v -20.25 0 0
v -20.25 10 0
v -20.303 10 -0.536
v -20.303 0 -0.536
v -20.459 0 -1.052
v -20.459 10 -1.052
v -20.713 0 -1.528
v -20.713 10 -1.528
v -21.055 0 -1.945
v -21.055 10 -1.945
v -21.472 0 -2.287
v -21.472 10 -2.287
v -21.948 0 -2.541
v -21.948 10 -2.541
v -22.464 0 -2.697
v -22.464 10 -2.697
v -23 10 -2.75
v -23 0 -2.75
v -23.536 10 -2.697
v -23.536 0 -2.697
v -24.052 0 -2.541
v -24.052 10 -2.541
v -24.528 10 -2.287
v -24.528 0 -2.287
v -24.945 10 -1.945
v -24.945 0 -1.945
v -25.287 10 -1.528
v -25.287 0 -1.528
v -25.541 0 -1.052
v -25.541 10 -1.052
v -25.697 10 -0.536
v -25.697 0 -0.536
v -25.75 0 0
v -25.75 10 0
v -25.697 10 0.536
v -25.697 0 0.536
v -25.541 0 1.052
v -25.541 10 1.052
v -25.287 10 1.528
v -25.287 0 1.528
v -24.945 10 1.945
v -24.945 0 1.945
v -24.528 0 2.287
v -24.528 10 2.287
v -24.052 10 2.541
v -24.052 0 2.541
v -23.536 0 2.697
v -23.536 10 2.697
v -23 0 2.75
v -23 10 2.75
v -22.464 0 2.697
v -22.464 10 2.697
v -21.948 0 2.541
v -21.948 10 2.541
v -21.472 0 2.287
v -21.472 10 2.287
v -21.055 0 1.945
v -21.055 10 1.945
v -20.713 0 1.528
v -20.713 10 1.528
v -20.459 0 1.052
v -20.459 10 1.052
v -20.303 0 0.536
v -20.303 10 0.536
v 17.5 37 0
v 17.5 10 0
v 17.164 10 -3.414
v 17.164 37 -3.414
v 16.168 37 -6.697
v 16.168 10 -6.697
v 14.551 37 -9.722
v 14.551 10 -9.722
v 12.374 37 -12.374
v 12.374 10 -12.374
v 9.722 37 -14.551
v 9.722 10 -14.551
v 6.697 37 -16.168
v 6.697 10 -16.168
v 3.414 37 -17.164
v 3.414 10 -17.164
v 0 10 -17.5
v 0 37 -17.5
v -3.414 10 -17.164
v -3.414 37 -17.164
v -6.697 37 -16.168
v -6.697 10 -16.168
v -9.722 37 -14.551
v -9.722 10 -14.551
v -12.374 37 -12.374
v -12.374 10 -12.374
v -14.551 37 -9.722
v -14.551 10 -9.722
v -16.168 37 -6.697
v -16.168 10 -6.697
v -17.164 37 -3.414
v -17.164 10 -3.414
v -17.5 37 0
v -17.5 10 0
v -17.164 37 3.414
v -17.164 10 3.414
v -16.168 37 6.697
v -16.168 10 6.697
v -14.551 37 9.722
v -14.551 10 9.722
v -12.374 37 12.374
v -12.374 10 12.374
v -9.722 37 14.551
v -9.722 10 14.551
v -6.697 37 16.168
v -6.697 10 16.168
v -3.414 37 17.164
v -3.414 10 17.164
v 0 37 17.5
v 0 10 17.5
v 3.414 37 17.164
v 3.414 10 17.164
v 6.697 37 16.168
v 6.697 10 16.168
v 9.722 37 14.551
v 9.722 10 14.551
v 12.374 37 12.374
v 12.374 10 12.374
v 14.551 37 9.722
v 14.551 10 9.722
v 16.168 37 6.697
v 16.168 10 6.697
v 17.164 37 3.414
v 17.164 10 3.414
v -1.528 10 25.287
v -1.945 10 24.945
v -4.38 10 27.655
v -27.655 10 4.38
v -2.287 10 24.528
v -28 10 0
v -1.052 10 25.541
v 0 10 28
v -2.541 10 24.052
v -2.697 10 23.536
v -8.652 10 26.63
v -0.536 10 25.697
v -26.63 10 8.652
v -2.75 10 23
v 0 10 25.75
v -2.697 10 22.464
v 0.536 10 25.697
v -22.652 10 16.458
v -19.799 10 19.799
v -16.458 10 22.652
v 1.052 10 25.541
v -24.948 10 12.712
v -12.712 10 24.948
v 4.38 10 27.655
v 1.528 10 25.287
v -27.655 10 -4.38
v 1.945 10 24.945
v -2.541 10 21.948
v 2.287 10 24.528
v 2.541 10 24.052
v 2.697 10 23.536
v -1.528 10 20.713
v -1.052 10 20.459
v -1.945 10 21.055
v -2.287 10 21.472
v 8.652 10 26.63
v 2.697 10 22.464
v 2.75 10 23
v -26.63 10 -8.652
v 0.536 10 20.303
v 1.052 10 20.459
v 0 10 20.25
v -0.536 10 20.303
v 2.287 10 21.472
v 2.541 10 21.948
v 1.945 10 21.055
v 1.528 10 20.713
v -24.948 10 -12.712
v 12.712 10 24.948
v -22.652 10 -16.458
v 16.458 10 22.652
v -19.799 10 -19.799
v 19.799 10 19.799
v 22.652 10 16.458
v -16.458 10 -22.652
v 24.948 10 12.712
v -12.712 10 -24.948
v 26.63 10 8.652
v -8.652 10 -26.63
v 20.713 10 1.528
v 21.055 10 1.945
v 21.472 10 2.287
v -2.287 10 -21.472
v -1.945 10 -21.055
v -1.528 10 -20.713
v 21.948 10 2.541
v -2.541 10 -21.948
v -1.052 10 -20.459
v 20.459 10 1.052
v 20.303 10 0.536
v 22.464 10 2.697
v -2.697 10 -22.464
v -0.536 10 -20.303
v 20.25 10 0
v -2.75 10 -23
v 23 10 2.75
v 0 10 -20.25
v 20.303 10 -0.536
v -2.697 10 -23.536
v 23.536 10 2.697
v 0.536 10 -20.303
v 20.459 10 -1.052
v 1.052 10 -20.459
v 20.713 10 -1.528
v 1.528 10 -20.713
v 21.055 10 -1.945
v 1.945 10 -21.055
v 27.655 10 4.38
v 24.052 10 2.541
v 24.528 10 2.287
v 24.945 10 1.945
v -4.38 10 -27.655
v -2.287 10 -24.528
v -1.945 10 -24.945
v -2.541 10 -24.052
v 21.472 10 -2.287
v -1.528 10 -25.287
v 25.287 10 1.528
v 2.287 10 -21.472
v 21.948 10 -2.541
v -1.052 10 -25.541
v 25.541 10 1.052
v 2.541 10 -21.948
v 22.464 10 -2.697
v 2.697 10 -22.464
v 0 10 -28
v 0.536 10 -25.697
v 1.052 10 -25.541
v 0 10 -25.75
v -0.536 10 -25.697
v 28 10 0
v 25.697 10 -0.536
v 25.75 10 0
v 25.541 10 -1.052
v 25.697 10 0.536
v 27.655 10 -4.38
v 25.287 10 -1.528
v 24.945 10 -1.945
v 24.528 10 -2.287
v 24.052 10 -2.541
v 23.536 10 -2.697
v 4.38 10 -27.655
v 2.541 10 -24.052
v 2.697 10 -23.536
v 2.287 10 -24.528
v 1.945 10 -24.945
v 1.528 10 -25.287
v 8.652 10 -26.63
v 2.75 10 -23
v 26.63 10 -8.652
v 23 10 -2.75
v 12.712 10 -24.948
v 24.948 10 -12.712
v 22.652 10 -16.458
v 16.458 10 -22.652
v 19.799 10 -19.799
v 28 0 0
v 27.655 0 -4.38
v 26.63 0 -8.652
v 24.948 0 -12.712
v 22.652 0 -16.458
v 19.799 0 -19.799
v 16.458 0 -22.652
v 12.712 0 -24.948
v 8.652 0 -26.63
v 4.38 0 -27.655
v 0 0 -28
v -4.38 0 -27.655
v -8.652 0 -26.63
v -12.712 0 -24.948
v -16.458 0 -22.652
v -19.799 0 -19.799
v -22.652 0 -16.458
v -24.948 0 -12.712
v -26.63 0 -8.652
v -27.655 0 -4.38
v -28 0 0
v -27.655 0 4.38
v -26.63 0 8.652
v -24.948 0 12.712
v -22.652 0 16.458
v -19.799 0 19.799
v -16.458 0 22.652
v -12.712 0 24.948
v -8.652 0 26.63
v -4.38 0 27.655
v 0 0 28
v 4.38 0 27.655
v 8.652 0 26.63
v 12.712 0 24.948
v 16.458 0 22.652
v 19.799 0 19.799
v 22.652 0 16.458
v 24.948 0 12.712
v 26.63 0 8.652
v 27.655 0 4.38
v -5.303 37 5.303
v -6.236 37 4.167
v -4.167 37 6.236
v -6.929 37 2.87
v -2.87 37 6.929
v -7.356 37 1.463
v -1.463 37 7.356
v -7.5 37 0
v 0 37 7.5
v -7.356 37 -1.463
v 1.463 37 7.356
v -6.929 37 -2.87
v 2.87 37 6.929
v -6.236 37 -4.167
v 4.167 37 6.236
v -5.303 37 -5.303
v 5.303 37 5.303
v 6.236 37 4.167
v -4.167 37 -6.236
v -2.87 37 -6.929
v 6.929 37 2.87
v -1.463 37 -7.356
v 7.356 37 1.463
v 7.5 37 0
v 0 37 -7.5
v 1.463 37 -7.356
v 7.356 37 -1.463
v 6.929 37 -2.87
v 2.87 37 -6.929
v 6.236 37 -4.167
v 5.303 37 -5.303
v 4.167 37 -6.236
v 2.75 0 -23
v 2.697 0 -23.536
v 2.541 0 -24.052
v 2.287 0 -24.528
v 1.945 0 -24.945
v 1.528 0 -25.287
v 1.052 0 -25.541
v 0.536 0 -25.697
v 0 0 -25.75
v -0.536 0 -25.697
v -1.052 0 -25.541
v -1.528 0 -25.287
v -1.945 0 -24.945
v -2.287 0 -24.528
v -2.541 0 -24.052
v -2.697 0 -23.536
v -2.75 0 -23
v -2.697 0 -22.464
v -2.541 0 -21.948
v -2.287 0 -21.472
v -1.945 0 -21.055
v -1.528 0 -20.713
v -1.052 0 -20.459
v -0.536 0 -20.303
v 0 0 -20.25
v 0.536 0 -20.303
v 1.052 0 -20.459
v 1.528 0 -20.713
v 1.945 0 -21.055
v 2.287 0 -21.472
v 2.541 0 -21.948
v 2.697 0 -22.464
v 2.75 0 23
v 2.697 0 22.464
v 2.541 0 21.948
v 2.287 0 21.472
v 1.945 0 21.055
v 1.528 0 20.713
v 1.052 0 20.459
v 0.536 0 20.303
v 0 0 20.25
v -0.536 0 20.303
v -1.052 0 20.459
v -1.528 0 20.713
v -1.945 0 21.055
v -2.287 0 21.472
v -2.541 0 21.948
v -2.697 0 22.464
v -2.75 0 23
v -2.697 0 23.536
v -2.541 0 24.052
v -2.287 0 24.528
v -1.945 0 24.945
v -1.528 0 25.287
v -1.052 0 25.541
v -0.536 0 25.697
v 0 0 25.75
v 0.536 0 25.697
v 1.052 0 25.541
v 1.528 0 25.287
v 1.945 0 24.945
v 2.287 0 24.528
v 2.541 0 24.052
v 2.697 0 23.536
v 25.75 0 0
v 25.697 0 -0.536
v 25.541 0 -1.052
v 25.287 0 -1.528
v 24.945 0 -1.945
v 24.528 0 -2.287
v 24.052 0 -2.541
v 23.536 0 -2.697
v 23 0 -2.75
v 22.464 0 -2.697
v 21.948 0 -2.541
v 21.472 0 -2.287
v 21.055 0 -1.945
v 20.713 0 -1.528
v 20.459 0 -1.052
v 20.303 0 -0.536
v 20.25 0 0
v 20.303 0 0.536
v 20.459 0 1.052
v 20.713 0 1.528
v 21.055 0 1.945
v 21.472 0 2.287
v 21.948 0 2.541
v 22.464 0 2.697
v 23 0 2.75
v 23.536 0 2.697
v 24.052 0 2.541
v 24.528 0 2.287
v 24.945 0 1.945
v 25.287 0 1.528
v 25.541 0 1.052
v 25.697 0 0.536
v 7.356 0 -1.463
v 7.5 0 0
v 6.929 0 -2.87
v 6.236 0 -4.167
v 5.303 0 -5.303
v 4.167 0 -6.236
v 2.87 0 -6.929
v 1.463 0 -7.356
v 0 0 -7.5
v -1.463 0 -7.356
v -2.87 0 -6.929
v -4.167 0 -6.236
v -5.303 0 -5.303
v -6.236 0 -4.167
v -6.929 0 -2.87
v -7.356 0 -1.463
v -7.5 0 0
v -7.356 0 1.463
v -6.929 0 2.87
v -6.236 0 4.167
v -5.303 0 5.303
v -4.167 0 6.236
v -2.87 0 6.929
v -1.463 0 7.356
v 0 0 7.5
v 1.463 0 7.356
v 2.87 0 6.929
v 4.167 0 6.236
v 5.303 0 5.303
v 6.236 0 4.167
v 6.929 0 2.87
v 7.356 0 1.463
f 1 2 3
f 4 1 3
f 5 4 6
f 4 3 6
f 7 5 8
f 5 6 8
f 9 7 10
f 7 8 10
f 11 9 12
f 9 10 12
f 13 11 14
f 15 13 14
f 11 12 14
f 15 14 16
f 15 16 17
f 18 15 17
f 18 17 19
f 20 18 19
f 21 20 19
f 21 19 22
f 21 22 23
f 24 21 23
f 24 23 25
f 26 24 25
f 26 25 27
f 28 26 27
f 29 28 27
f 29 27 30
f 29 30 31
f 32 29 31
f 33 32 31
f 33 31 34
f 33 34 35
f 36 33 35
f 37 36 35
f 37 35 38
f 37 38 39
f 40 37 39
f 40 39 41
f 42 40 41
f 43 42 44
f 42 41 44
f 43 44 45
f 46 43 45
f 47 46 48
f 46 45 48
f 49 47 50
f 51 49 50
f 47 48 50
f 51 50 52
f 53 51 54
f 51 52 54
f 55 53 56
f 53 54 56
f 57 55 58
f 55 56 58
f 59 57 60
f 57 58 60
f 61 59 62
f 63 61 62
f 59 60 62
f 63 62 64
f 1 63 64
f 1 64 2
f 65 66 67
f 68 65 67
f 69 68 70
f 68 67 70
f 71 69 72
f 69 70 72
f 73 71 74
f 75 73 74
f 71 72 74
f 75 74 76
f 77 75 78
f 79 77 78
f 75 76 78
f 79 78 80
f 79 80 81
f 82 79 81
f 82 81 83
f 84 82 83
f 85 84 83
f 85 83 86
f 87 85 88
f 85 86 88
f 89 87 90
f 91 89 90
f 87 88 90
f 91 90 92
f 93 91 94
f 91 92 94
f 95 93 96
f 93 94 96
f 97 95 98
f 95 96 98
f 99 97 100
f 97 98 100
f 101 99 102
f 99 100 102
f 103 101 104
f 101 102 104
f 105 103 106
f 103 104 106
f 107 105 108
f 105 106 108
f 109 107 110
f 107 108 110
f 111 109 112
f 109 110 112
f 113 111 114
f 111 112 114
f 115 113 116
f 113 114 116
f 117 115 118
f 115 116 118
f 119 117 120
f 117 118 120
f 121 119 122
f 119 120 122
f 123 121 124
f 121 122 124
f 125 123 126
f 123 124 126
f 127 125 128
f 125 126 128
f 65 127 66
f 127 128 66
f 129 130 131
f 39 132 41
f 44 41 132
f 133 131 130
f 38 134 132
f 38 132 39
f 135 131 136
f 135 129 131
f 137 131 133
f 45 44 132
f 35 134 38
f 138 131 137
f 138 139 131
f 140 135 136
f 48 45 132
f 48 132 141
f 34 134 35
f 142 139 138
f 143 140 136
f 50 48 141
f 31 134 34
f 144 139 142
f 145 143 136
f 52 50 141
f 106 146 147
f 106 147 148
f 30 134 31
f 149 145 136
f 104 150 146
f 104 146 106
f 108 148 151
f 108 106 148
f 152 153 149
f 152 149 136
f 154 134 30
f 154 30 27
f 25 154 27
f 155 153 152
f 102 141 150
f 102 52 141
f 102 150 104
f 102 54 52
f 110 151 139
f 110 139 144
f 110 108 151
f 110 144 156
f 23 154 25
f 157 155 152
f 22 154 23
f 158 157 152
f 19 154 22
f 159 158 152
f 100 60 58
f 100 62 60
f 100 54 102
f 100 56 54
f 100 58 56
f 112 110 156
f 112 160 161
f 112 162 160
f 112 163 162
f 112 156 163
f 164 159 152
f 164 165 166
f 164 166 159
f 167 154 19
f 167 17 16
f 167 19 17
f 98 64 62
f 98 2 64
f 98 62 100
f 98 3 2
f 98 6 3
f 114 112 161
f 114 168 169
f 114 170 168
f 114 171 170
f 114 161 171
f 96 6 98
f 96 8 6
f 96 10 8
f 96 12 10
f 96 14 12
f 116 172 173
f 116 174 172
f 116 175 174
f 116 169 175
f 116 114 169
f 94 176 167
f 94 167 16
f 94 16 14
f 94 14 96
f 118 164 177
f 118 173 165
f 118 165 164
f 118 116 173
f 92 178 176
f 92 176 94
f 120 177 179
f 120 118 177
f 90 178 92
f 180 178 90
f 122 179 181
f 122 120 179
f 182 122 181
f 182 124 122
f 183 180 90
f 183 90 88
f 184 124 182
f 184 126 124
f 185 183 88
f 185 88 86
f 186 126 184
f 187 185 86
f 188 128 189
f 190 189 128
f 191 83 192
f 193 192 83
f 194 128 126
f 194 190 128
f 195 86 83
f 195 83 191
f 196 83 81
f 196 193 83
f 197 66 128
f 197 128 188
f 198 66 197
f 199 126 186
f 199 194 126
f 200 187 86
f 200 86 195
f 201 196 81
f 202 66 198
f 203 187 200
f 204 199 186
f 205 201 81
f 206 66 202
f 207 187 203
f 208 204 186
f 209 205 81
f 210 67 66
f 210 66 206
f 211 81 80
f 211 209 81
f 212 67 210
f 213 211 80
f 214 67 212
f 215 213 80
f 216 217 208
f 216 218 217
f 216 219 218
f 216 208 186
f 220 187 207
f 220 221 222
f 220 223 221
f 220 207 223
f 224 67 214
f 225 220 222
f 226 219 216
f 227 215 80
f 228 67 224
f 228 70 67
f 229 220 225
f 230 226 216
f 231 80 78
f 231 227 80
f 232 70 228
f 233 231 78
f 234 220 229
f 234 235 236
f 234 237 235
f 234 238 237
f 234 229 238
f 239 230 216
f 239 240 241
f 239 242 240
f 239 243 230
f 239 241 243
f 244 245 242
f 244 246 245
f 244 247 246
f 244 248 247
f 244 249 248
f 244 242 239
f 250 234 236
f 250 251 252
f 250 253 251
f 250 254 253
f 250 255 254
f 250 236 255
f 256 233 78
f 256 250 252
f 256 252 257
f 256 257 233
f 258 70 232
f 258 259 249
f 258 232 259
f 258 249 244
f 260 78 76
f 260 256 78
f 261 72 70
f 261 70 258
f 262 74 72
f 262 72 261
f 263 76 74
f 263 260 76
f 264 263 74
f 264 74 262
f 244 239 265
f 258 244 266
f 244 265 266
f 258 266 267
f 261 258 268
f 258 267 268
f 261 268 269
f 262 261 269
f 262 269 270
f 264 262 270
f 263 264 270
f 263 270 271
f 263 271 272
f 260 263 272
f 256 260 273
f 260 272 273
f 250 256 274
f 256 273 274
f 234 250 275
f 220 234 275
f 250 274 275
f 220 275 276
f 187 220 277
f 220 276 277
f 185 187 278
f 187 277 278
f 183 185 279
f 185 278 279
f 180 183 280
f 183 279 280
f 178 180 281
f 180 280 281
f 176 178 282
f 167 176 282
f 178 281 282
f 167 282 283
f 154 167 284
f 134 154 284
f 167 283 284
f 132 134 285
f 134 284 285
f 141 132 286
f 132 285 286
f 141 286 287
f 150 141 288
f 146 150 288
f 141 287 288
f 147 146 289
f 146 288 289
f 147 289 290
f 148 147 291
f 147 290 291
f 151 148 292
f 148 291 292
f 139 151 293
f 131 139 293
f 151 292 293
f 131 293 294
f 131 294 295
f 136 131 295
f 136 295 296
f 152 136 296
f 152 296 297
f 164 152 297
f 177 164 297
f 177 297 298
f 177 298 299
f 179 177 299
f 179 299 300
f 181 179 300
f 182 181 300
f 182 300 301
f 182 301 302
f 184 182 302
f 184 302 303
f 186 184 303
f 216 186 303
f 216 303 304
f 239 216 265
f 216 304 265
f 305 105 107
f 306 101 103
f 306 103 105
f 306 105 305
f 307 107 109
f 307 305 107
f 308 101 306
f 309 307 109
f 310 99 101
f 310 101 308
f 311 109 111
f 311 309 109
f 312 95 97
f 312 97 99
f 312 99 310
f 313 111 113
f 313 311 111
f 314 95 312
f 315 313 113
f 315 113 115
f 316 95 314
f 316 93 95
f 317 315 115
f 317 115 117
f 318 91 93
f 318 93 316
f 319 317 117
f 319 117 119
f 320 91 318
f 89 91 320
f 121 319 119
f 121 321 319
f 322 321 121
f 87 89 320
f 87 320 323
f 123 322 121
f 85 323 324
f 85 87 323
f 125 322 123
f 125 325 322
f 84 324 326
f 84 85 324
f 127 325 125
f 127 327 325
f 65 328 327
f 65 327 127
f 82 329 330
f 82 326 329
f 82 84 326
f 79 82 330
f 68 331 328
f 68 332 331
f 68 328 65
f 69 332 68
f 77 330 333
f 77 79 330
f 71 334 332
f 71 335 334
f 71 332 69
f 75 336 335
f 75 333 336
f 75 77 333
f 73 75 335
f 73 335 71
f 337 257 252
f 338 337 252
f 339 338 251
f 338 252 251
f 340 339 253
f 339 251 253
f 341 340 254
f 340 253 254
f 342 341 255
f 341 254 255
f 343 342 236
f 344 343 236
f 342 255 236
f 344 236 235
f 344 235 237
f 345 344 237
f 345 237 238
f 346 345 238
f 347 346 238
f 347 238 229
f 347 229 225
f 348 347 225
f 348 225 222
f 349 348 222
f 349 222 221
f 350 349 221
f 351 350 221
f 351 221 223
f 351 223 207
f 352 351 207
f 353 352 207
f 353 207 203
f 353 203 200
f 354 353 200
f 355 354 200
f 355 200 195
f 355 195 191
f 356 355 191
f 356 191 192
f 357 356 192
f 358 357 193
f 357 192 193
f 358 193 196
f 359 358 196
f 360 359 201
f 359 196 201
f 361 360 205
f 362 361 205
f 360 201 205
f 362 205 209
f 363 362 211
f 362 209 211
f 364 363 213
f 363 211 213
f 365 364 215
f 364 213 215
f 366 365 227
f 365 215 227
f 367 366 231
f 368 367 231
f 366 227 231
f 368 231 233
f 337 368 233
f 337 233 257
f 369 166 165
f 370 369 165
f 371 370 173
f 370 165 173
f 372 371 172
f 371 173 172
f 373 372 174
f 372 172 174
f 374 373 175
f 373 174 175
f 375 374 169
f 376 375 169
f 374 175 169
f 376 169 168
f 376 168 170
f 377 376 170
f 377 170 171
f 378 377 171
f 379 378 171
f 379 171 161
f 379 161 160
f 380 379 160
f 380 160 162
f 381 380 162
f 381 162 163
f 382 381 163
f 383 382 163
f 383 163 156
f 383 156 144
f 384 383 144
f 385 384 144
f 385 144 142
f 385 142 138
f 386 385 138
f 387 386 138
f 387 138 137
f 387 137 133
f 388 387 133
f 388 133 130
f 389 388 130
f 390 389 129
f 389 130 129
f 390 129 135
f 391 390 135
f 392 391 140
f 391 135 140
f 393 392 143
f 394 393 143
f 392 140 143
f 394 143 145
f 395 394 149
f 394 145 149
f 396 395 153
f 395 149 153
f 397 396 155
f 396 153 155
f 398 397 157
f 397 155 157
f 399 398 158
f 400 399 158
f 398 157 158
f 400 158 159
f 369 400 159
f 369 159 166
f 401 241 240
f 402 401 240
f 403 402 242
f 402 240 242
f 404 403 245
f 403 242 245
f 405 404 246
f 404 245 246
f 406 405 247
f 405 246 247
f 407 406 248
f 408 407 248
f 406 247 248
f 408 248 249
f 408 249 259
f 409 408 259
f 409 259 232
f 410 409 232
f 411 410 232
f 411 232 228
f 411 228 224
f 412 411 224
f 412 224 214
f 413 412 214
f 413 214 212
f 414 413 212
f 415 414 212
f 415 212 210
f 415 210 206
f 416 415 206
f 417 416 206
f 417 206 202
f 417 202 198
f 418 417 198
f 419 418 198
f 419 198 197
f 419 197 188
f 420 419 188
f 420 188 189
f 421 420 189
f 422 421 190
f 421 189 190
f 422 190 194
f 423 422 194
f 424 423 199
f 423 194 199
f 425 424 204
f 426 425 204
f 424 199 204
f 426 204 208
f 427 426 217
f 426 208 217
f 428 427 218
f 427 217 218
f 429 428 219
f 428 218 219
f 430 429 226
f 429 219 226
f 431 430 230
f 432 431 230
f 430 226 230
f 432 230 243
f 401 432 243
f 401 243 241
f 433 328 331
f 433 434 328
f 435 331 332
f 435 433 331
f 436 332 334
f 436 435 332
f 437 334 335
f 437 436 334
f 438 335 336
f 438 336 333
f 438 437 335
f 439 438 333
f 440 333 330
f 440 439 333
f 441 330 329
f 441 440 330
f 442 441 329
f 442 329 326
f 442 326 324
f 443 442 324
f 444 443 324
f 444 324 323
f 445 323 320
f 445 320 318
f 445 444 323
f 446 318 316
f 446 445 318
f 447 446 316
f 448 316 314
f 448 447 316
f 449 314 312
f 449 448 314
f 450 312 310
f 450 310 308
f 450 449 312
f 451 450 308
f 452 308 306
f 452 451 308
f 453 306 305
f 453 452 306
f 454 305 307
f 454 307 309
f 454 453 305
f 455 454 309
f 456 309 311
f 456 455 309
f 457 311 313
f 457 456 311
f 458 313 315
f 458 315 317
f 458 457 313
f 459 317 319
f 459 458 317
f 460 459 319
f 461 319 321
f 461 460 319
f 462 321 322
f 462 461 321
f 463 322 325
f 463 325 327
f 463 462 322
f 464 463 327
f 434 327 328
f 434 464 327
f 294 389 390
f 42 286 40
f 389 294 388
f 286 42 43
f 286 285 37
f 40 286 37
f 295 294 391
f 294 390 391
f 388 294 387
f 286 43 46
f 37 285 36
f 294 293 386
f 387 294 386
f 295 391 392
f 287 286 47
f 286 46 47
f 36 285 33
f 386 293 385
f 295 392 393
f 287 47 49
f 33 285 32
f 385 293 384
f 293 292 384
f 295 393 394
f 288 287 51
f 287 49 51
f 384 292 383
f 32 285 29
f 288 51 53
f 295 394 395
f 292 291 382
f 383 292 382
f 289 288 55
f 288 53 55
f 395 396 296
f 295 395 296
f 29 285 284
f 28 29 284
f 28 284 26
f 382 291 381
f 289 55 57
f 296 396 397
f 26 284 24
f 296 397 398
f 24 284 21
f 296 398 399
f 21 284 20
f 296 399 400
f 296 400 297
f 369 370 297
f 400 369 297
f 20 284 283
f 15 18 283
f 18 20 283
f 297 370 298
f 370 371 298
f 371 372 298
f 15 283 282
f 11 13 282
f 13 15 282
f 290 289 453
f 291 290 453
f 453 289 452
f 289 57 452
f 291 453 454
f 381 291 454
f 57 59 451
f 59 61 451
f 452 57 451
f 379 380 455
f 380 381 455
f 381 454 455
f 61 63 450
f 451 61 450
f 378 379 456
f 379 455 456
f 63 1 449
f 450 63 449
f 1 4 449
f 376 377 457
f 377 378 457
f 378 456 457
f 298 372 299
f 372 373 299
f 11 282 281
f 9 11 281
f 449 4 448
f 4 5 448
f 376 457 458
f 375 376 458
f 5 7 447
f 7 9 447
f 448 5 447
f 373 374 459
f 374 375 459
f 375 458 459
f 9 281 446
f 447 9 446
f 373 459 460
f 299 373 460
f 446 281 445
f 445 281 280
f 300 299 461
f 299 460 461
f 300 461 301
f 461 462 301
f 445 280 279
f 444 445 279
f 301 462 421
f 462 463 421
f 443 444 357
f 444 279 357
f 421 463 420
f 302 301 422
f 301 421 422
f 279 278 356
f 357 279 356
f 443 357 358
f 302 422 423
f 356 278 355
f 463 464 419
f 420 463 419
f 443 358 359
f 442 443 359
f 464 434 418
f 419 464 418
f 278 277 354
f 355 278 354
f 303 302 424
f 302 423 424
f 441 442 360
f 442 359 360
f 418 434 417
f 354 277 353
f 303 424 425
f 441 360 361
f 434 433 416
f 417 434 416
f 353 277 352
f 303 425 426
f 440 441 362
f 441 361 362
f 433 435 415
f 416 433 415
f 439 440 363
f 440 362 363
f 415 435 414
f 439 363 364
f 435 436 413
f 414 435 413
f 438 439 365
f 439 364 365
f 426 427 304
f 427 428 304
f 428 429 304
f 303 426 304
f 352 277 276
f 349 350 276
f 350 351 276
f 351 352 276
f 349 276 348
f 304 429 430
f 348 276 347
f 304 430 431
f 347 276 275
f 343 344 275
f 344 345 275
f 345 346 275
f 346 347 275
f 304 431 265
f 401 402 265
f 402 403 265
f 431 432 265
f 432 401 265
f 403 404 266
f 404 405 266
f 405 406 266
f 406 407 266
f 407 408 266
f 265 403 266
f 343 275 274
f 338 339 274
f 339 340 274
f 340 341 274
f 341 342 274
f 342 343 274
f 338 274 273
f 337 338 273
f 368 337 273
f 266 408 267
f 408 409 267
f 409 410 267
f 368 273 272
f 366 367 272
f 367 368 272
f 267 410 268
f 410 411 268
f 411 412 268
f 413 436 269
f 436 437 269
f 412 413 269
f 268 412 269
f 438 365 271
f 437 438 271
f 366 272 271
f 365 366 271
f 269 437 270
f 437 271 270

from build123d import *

# Parameters (mm, degrees)
SKETCH_1_R          = 28
SKETCH_1_R_2        = 7.5
EXTRUDE_1_DEPTH     = 10
SKETCH_2_R          = 17.5
SKETCH_2_R_2        = 7.5
EXTRUDE_2_DEPTH     = 27
SKETCH_3_R          = 2.75
CUT_EXTRUDE_1_DEPTH = 27


with BuildPart() as part:
    # 草图1 → 凸台-拉伸1 (new body)
    with BuildSketch(Plane(origin=(0, 0, 0), x_dir=(1, 0, 0), z_dir=(0, 1, 0))):
        Circle(SKETCH_1_R)
        Circle(SKETCH_1_R_2, mode=Mode.SUBTRACT)
    extrude(amount=EXTRUDE_1_DEPTH)

    # 草图2 → 凸台-拉伸2 (add)
    with BuildSketch(Plane(origin=(0, 10, 0), x_dir=(1, 0, 0), z_dir=(0, 1, 0))):
        Circle(SKETCH_2_R)
        Circle(SKETCH_2_R_2, mode=Mode.SUBTRACT)
    extrude(amount=EXTRUDE_2_DEPTH)

    # 草图3 → 切除-拉伸1 (cut)
    with BuildSketch(Plane(origin=(0, 10, 0), x_dir=(1, 0, 0), z_dir=(0, 1, 0))):
        with Locations((0, 23)):
            Circle(SKETCH_3_R)
        with Locations((23, 0)):
            Circle(SKETCH_3_R)
        with Locations((0, -23)):
            Circle(SKETCH_3_R)
        with Locations((-23, 0)):
            Circle(SKETCH_3_R)
    extrude(amount=-CUT_EXTRUDE_1_DEPTH, mode=Mode.SUBTRACT)


solid = part.part
